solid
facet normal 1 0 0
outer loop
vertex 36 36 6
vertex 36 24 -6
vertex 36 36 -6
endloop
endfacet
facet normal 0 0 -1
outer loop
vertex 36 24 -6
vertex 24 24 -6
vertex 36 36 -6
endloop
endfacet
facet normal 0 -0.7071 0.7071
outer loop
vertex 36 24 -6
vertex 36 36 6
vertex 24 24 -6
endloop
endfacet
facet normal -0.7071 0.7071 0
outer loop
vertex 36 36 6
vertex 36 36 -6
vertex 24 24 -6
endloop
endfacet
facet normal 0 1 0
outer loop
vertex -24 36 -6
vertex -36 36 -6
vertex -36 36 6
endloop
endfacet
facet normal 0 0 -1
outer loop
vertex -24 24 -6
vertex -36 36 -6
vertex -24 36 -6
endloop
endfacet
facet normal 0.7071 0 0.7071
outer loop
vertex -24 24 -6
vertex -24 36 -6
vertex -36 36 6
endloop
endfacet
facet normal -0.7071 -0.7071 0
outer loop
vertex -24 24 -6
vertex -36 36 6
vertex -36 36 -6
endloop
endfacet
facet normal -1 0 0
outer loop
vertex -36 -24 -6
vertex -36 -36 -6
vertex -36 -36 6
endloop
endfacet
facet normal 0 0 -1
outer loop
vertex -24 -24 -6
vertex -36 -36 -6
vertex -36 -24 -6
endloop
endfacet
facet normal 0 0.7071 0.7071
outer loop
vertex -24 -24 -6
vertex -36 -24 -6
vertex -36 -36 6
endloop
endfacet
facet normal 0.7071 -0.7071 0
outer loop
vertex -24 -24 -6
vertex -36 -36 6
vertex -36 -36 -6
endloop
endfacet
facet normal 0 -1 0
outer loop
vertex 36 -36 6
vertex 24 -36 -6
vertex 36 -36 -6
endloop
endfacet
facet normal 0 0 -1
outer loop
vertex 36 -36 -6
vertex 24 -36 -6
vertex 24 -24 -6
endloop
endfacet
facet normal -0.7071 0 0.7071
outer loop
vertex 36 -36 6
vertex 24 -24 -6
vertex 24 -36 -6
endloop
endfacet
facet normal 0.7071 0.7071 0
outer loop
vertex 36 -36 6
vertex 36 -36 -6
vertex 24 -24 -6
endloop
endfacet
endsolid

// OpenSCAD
// file: def.scad
total_size = 72;
block_size_2 = total_size / 2 - 0.1;
block_size_4 = total_size / 4;
block_size_6 = total_size / 6;

inf = 1000;

round_radius = 1;
sticker_margin = 2.5;
sticker_round_radius = 0.75;

module _block(size) {
    minkowski() {
        cube([size - round_radius * 2, size - round_radius * 2, size - round_radius * 2], center = true);
        sphere(r = round_radius, $fn = 24);
    }
}

module _selector_0(size) {
    cube([size - 0.2, size - 0.2, size - 0.2], center = true);
}

module _sticker(size) {
    minkowski() {
        cube([size - sticker_margin * 2, size - sticker_margin * 2, 0.1], center = true);
        cylinder(r = sticker_round_radius, h = 0.1, $fn = 24);
    }
}

module _selector_corner_cw(size) {
    difference() {
        cube([size, size, size], center = true);
        rotate([0, -45, 0])
            translate([-inf, -inf, 0])
                cube([inf * 2, inf * 2, inf]);
        rotate([90, 0, 45])
            translate([-inf, -inf, 0])
                cube([inf * 2, inf * 2, inf]);
    }
}

module _selector_corner_ccw(size) {
    difference() {
        cube([size, size, size], center = true);
        rotate([45, 0, 0])
            translate([-inf, -inf, 0])
                cube([inf * 2, inf * 2, inf]);
        rotate([0, -90, -45])
            translate([-inf, -inf, 0])
                cube([inf * 2, inf * 2, inf]);
    }
}

module _selector_edge_cw(size) {
    difference() {
        cube([size, size, size], center = true);
        rotate([90, 0, 45])
            translate([-inf, -inf, 0])
                cube([inf * 2, inf * 2, inf]);
    }
}

module _selector_edge_ccw(size) {
    difference() {
        cube([size, size, size], center = true);
        rotate([0, -90, -45])
            translate([-inf, -inf, 0])
                cube([inf * 2, inf * 2, inf]);
    }
}
// main file
include <def.scad>

for (deg = [0 : 90 : 270])
    rotate([0, 0, deg])
        translate([block_size_6 * 2.5, block_size_6 * 2.5, 0])
            _selector_corner_ccw(block_size_6);
